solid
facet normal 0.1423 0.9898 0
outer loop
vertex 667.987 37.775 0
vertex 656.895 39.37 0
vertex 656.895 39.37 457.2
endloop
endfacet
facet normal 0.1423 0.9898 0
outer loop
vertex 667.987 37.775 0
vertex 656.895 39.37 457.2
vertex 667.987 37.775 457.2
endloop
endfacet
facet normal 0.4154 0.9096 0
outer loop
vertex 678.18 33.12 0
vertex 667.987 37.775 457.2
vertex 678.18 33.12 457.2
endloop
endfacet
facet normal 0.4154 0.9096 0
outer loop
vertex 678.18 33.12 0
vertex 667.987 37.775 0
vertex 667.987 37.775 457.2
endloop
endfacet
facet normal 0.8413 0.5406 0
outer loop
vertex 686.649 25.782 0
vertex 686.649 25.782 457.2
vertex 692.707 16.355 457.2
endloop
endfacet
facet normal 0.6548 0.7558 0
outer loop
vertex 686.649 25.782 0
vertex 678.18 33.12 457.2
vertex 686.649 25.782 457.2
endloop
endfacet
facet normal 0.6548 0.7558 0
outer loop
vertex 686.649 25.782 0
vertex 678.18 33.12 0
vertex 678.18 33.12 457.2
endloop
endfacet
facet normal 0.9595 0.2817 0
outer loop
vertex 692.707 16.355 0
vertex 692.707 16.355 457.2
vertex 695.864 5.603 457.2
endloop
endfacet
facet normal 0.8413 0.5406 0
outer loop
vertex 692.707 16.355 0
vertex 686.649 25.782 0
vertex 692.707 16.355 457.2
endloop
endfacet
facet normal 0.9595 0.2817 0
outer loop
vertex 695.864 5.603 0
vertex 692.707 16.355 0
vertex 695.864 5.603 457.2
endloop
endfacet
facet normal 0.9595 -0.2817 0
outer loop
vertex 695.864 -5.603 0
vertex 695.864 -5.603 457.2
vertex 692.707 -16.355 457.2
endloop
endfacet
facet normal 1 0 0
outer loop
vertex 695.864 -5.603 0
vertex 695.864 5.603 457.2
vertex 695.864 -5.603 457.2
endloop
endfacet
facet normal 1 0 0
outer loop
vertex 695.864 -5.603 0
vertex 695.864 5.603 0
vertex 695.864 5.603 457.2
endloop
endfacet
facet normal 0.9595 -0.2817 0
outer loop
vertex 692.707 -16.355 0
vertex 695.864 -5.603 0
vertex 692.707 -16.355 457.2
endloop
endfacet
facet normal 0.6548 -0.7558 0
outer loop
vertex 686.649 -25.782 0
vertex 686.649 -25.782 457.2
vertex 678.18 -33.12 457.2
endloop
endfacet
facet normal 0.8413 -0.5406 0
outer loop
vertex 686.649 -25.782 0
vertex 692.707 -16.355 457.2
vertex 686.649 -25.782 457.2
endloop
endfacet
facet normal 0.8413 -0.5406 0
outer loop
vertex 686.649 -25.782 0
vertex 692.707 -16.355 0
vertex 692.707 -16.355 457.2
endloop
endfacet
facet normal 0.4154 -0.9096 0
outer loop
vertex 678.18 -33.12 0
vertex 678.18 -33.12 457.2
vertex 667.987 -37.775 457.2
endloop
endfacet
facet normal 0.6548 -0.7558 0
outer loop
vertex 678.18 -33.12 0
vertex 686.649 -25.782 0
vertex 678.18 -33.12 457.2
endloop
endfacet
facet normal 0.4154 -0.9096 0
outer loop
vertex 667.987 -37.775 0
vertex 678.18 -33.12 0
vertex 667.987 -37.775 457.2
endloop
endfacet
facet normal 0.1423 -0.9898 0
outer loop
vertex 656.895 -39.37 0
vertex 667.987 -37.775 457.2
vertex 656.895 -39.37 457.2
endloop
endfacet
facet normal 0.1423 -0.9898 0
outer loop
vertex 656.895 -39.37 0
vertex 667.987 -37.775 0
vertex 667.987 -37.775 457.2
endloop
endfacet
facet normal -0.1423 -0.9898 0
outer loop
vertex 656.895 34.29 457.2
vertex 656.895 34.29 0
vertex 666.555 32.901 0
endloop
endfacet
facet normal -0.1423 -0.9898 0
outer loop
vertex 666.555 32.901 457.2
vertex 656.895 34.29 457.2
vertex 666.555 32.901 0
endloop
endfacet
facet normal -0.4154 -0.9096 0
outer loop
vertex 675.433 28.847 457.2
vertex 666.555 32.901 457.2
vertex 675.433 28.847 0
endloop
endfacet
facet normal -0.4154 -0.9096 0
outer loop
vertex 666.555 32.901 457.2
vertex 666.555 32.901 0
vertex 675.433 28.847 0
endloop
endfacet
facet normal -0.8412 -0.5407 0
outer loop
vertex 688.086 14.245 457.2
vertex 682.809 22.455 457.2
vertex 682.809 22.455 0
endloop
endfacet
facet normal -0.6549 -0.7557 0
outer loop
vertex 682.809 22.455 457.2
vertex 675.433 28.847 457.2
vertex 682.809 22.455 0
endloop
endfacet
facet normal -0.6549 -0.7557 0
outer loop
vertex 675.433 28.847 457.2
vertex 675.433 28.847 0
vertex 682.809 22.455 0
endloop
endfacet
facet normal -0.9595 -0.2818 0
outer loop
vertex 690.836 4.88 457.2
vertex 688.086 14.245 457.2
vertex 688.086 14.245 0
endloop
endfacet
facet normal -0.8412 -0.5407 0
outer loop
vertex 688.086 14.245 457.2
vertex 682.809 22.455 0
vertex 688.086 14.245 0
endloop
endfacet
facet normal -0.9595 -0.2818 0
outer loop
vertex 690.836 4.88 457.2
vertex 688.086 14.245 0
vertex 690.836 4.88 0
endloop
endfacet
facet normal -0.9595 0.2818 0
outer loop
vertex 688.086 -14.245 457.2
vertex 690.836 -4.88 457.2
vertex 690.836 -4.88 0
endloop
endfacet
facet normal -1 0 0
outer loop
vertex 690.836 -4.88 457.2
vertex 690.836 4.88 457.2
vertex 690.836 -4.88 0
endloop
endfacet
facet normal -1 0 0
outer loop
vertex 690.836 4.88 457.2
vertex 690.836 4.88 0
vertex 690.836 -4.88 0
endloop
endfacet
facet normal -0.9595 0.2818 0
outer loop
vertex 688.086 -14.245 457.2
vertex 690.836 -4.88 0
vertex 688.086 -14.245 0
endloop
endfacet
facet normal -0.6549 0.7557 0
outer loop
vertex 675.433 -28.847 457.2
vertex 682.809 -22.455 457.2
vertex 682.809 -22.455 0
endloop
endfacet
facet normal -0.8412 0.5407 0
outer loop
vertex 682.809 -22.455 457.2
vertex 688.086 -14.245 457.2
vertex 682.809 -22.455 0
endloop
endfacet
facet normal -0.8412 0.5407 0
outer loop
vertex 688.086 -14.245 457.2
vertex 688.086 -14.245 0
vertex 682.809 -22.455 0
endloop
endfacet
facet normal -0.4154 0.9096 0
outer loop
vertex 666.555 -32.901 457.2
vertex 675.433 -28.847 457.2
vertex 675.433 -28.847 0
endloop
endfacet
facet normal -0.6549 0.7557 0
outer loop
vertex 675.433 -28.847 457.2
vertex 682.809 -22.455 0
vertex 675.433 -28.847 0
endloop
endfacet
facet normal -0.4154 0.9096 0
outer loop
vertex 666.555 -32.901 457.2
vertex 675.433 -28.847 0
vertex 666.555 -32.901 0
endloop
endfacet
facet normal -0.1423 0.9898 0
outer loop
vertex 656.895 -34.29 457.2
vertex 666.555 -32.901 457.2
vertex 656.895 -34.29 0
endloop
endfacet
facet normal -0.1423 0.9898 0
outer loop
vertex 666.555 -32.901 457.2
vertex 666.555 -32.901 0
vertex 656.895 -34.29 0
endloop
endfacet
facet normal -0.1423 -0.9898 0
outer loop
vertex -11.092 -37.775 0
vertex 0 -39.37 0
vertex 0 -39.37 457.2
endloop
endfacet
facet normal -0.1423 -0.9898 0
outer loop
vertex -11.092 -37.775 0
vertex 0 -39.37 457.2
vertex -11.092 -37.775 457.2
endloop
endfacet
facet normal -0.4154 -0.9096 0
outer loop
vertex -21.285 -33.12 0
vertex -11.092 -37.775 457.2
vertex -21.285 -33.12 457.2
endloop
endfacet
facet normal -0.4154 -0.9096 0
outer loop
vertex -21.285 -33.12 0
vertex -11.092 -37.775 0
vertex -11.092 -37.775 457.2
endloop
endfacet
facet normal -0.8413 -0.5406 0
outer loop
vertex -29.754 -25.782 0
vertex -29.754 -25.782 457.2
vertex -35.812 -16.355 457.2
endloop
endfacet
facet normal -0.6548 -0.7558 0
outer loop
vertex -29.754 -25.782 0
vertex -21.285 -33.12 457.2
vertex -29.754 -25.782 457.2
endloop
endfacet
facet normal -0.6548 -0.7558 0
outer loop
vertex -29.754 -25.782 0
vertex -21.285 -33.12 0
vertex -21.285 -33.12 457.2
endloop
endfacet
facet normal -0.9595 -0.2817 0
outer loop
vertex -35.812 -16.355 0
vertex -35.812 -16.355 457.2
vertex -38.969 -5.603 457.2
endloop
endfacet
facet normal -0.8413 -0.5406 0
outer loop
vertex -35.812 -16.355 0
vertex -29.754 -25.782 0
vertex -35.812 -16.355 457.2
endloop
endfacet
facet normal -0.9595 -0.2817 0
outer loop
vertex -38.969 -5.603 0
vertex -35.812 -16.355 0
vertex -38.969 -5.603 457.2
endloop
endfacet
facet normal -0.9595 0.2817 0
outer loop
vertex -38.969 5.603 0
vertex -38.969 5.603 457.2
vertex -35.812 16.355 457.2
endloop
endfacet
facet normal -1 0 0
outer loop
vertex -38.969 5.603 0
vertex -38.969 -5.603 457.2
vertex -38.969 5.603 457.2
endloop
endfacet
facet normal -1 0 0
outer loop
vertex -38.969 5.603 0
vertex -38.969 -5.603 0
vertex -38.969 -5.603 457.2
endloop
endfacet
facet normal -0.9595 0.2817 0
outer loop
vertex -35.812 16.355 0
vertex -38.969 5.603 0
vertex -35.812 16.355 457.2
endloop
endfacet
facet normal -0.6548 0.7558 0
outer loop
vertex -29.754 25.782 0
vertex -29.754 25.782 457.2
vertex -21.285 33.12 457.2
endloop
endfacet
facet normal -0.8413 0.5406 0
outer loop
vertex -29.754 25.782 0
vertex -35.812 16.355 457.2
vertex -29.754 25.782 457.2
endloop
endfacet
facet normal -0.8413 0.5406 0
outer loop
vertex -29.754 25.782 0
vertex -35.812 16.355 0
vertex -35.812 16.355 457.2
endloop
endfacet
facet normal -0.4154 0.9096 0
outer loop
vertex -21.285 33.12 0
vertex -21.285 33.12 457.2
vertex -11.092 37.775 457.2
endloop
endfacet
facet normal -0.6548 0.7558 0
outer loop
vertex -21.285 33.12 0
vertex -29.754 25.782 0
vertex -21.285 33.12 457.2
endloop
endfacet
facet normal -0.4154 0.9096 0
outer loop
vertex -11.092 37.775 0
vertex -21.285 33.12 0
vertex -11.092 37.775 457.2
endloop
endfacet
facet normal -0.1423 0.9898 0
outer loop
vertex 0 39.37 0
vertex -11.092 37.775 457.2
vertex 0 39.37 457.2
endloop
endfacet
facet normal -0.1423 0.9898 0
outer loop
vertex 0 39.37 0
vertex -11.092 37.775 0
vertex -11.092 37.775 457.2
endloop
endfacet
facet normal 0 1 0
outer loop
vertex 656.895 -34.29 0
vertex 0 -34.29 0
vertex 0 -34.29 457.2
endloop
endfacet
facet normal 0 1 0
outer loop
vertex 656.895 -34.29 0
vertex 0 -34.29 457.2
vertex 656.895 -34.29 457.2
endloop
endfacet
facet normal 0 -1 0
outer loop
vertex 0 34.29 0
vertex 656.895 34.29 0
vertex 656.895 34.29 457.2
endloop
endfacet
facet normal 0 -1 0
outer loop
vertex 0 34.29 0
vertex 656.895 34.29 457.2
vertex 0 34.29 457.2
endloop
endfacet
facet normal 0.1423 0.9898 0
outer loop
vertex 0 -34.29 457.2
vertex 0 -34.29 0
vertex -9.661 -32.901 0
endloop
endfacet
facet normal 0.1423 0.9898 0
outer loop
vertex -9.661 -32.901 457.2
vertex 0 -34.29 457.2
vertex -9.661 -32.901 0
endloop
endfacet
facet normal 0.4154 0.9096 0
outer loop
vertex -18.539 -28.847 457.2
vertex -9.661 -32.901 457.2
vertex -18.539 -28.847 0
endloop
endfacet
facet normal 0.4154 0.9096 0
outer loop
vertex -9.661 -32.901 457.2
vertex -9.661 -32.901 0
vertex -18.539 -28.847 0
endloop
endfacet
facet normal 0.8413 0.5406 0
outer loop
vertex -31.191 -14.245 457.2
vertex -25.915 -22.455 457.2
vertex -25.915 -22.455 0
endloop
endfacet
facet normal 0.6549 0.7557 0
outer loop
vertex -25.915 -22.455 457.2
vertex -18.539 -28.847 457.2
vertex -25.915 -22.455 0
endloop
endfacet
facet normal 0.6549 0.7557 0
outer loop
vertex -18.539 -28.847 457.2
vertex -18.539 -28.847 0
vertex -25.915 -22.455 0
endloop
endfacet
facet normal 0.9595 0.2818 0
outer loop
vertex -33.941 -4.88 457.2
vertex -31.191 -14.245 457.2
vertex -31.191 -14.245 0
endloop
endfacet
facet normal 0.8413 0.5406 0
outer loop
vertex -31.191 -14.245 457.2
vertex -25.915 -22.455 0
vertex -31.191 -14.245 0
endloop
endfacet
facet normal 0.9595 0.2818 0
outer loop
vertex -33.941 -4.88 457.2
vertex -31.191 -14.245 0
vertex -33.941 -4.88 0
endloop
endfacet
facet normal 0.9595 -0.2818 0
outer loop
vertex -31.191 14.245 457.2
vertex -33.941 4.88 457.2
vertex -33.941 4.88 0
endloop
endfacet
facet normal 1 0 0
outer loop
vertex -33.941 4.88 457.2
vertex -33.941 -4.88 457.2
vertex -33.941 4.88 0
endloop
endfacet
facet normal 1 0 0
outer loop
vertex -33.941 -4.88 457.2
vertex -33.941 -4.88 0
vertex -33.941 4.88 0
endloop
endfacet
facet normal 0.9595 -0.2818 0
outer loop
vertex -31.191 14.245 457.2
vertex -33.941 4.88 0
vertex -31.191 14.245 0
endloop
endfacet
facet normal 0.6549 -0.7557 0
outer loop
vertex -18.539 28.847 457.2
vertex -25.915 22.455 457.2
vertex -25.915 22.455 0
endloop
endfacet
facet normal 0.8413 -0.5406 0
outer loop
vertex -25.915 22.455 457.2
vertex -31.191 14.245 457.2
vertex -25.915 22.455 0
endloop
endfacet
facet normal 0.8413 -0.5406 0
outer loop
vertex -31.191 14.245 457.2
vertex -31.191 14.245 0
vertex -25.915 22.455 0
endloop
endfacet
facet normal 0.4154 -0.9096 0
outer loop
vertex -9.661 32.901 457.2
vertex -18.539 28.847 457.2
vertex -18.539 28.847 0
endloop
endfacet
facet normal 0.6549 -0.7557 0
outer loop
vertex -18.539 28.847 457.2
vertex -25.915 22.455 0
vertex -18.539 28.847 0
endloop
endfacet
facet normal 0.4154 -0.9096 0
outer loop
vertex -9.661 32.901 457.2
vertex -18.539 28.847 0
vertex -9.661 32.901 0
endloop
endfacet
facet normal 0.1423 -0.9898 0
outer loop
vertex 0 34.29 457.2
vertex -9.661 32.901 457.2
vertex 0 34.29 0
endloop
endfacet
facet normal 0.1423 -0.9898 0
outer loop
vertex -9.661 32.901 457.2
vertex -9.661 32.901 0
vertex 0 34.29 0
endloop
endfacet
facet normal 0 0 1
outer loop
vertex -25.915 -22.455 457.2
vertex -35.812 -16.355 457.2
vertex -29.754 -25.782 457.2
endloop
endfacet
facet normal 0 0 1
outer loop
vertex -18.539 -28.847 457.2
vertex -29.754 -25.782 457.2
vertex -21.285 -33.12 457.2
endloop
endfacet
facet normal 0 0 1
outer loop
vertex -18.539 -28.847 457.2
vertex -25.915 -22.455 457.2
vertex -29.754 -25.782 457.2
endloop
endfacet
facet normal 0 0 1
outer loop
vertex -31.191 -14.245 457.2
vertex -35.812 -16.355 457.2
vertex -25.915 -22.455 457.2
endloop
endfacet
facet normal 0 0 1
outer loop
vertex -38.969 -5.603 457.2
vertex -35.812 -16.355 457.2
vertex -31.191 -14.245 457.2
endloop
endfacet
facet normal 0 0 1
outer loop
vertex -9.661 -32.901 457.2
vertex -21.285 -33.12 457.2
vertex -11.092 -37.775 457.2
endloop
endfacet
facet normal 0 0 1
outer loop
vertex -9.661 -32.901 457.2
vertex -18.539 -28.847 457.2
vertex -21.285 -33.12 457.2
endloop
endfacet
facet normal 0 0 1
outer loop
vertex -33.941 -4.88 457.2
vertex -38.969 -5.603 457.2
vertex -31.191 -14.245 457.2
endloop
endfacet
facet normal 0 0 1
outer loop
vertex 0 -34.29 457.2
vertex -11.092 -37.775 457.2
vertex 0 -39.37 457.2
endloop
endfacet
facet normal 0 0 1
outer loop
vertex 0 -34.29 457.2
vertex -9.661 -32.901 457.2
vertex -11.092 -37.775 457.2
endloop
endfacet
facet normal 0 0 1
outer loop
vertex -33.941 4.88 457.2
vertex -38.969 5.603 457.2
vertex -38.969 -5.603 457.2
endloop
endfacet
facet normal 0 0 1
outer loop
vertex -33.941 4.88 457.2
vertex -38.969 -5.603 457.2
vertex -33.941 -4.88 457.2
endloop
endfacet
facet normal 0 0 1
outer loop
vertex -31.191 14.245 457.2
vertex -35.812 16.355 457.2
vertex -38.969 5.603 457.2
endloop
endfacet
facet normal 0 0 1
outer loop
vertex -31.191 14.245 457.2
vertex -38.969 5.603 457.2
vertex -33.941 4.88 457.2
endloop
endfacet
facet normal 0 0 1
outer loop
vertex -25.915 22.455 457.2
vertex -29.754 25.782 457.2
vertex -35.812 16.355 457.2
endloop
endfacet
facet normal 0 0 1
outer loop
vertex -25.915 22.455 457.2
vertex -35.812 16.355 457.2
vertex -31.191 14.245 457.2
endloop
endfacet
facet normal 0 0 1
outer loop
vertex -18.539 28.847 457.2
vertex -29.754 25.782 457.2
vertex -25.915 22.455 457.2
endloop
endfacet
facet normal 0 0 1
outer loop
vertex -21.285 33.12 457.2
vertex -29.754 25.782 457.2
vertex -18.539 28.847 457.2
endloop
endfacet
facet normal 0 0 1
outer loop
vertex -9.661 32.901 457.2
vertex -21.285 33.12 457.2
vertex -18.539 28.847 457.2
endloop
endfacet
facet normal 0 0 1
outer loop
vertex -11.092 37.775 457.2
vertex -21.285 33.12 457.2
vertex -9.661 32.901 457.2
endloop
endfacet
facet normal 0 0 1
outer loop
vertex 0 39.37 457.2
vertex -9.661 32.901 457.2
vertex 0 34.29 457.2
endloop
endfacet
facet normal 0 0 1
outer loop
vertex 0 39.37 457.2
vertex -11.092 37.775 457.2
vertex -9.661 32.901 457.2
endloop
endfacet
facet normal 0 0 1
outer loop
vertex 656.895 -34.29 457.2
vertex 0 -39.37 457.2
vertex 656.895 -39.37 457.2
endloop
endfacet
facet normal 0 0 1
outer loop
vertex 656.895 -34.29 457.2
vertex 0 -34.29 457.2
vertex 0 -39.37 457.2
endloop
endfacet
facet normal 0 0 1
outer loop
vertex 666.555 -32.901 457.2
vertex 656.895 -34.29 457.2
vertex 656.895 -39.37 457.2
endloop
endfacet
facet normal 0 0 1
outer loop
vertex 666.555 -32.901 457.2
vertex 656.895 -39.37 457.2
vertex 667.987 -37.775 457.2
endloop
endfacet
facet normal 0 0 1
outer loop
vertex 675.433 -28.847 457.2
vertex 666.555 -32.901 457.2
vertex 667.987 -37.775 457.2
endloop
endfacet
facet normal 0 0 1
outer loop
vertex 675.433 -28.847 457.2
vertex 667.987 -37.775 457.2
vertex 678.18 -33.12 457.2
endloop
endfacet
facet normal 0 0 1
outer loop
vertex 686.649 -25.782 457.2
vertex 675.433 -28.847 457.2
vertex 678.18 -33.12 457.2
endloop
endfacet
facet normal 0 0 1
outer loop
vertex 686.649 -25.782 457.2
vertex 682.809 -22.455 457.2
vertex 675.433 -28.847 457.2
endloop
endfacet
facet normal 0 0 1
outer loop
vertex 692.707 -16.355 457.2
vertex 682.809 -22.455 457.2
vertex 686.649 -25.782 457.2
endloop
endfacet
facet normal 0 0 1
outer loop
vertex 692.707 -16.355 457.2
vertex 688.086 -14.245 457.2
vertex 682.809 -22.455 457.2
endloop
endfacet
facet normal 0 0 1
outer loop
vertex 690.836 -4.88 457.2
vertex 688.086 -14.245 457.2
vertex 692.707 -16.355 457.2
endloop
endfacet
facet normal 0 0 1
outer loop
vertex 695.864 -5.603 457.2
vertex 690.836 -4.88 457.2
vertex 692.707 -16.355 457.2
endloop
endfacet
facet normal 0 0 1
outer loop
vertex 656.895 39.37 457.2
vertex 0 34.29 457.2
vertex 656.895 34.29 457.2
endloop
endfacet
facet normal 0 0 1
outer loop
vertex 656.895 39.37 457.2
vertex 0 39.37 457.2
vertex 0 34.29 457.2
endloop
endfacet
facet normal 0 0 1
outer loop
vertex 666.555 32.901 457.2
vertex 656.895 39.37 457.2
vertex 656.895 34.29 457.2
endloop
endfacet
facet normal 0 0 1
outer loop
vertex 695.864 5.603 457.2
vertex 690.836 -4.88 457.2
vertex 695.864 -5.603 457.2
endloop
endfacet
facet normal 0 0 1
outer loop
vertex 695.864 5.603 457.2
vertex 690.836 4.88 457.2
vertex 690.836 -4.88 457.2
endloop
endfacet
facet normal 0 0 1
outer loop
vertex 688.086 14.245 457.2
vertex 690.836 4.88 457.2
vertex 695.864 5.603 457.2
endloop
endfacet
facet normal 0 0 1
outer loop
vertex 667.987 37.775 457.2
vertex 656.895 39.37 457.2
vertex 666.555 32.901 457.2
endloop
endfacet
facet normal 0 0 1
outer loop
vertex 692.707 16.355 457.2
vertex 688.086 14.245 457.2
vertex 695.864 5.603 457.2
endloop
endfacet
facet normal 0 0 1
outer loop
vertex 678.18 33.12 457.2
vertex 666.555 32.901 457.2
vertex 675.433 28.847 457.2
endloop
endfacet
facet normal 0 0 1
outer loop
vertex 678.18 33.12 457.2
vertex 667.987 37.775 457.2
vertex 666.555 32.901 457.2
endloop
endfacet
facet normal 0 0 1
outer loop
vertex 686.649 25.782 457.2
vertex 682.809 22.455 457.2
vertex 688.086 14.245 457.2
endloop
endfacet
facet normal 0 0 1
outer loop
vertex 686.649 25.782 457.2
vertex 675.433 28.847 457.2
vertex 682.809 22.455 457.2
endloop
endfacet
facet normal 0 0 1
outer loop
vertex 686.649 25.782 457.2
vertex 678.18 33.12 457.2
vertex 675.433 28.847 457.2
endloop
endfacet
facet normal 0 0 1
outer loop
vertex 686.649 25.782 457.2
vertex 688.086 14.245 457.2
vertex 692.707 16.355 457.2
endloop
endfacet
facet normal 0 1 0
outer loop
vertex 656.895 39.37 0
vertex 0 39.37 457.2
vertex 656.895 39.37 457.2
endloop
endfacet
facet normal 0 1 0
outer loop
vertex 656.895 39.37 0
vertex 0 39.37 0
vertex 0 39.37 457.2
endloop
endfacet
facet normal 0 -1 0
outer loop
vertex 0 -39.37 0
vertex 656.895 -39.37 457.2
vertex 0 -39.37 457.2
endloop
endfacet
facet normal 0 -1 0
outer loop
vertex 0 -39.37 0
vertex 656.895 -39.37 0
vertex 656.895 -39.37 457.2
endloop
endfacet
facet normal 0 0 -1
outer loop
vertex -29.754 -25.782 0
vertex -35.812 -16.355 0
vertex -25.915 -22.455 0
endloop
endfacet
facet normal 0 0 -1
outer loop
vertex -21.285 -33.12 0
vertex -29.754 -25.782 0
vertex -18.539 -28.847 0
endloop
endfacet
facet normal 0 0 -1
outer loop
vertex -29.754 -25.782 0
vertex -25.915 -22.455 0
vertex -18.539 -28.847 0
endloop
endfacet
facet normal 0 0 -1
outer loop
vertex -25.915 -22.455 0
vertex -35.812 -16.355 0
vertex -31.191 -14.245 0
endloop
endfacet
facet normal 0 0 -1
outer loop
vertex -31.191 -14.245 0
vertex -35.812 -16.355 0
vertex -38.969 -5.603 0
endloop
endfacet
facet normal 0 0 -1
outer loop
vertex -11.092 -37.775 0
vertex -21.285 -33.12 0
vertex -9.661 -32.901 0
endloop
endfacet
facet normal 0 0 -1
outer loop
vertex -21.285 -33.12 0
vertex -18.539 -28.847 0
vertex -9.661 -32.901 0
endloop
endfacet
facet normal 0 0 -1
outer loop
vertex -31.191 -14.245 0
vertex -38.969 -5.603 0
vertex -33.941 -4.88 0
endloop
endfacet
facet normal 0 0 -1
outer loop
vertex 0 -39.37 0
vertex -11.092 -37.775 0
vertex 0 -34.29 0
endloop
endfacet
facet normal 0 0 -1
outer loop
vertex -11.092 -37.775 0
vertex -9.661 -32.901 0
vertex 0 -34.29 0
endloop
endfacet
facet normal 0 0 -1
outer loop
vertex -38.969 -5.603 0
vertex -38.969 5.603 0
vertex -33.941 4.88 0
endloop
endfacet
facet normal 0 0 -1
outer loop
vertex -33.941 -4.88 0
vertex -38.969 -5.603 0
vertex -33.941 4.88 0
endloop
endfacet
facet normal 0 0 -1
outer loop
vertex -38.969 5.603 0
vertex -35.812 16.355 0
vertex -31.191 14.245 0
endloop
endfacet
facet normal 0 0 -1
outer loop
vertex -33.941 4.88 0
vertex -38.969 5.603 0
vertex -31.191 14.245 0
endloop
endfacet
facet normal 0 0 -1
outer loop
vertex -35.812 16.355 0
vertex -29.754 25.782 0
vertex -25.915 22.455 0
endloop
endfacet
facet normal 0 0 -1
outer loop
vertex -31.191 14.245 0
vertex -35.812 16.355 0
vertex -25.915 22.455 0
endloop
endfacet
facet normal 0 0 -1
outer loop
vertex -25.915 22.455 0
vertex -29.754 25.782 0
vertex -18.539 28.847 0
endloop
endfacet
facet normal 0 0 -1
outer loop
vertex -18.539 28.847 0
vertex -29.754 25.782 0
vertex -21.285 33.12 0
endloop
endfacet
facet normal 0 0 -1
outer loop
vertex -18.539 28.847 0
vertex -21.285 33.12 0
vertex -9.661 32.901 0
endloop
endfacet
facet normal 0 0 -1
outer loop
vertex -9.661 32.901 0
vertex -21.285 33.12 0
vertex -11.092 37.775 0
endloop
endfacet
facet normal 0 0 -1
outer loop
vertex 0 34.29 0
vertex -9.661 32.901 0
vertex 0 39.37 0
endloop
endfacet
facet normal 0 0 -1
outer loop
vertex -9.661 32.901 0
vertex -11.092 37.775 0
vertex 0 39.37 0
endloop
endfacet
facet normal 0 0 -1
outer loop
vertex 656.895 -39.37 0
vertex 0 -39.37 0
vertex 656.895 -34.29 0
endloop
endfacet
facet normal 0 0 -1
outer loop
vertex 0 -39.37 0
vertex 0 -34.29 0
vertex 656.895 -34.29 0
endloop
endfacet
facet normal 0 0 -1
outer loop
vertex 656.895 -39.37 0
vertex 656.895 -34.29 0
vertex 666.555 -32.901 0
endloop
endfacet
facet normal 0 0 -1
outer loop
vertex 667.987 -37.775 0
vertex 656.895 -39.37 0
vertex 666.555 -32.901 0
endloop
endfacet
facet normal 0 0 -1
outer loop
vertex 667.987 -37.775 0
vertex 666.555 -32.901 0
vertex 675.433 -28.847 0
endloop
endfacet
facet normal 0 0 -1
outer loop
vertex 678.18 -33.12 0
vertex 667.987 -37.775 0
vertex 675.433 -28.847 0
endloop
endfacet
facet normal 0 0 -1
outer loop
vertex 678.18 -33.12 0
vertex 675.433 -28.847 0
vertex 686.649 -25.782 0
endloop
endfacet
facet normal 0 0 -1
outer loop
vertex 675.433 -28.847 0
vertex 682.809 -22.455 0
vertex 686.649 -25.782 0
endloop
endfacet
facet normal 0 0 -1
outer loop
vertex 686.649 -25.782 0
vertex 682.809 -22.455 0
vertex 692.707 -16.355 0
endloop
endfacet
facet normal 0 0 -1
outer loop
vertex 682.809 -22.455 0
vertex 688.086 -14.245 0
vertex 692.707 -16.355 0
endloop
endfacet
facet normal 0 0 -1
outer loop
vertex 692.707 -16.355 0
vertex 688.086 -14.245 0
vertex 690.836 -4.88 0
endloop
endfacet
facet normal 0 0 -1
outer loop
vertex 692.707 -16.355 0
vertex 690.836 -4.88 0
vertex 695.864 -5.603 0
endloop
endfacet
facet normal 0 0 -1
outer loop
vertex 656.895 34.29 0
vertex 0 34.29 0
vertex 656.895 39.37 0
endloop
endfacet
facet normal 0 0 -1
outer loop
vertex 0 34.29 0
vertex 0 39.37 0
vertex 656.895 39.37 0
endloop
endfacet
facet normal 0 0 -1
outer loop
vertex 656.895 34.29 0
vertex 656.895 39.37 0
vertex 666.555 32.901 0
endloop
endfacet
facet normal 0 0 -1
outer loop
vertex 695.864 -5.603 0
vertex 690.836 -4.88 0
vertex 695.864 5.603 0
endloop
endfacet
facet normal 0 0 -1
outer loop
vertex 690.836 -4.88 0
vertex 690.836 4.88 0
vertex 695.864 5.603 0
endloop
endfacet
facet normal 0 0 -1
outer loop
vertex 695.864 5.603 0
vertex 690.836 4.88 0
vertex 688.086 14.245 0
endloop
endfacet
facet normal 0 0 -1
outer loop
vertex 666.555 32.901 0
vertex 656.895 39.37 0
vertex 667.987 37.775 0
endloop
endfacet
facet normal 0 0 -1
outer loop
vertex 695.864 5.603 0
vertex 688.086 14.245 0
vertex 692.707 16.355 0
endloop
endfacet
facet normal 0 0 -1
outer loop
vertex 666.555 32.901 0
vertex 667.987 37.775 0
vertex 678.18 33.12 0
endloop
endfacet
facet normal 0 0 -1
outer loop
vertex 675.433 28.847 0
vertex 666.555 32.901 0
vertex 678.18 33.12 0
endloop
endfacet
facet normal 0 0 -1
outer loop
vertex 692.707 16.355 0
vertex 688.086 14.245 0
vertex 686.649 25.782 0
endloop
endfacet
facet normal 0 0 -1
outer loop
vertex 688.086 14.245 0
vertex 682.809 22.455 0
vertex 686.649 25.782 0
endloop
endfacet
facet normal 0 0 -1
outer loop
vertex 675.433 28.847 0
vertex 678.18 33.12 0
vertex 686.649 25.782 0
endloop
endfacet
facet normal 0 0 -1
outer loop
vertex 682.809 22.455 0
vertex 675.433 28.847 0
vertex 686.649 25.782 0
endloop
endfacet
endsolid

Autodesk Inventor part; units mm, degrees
ref_plane "YZ Plane" through (0, 0, 0) normal (1, 0, 0) x (0, 1, 0)
ref_plane "XZ Plane" through (0, 0, 0) normal (0, 1, 0) x (-1, 0, 0)
ref_plane "XY Plane" through (0, 0, 0) normal (0, 0, 1) x (1, 0, 0)
sketch "Sketch1" plane through (0, 0, 0) normal (0, 0, 1) x (1, 0, 0)
  arc A0 (0, 34.29) -> (0, -34.29) centre (0, 0) ccw
  arc A1 (0, 39.37) -> (0, -39.37) centre (0, 0) ccw
  line L0 (0, 0) -> (656.8948, 0)
  arc A2 (656.8948, -34.29) -> (656.8948, 34.29) centre (656.8948, 0) ccw
  arc A3 (656.8948, -39.37) -> (656.8948, 39.37) centre (656.8948, 0) ccw
  line L1 (0, 39.37) -> (656.8948, 39.37)
  line L2 (656.8948, 34.29) -> (0, 34.29)
  line L3 (0, -34.29) -> (656.8948, -34.29)
  line L4 (656.8948, -39.37) -> (0, -39.37)
  dimension "d0" = 68.58
  dimension "d1" = 78.74
  dimension "d2" = 656.8948
  dimension "d3" = 68.58
  dimension "d4" = 78.74
extrude "Extrusion1" add sketch "Sketch1" along normal blind 457.2
properties part number "bult"
